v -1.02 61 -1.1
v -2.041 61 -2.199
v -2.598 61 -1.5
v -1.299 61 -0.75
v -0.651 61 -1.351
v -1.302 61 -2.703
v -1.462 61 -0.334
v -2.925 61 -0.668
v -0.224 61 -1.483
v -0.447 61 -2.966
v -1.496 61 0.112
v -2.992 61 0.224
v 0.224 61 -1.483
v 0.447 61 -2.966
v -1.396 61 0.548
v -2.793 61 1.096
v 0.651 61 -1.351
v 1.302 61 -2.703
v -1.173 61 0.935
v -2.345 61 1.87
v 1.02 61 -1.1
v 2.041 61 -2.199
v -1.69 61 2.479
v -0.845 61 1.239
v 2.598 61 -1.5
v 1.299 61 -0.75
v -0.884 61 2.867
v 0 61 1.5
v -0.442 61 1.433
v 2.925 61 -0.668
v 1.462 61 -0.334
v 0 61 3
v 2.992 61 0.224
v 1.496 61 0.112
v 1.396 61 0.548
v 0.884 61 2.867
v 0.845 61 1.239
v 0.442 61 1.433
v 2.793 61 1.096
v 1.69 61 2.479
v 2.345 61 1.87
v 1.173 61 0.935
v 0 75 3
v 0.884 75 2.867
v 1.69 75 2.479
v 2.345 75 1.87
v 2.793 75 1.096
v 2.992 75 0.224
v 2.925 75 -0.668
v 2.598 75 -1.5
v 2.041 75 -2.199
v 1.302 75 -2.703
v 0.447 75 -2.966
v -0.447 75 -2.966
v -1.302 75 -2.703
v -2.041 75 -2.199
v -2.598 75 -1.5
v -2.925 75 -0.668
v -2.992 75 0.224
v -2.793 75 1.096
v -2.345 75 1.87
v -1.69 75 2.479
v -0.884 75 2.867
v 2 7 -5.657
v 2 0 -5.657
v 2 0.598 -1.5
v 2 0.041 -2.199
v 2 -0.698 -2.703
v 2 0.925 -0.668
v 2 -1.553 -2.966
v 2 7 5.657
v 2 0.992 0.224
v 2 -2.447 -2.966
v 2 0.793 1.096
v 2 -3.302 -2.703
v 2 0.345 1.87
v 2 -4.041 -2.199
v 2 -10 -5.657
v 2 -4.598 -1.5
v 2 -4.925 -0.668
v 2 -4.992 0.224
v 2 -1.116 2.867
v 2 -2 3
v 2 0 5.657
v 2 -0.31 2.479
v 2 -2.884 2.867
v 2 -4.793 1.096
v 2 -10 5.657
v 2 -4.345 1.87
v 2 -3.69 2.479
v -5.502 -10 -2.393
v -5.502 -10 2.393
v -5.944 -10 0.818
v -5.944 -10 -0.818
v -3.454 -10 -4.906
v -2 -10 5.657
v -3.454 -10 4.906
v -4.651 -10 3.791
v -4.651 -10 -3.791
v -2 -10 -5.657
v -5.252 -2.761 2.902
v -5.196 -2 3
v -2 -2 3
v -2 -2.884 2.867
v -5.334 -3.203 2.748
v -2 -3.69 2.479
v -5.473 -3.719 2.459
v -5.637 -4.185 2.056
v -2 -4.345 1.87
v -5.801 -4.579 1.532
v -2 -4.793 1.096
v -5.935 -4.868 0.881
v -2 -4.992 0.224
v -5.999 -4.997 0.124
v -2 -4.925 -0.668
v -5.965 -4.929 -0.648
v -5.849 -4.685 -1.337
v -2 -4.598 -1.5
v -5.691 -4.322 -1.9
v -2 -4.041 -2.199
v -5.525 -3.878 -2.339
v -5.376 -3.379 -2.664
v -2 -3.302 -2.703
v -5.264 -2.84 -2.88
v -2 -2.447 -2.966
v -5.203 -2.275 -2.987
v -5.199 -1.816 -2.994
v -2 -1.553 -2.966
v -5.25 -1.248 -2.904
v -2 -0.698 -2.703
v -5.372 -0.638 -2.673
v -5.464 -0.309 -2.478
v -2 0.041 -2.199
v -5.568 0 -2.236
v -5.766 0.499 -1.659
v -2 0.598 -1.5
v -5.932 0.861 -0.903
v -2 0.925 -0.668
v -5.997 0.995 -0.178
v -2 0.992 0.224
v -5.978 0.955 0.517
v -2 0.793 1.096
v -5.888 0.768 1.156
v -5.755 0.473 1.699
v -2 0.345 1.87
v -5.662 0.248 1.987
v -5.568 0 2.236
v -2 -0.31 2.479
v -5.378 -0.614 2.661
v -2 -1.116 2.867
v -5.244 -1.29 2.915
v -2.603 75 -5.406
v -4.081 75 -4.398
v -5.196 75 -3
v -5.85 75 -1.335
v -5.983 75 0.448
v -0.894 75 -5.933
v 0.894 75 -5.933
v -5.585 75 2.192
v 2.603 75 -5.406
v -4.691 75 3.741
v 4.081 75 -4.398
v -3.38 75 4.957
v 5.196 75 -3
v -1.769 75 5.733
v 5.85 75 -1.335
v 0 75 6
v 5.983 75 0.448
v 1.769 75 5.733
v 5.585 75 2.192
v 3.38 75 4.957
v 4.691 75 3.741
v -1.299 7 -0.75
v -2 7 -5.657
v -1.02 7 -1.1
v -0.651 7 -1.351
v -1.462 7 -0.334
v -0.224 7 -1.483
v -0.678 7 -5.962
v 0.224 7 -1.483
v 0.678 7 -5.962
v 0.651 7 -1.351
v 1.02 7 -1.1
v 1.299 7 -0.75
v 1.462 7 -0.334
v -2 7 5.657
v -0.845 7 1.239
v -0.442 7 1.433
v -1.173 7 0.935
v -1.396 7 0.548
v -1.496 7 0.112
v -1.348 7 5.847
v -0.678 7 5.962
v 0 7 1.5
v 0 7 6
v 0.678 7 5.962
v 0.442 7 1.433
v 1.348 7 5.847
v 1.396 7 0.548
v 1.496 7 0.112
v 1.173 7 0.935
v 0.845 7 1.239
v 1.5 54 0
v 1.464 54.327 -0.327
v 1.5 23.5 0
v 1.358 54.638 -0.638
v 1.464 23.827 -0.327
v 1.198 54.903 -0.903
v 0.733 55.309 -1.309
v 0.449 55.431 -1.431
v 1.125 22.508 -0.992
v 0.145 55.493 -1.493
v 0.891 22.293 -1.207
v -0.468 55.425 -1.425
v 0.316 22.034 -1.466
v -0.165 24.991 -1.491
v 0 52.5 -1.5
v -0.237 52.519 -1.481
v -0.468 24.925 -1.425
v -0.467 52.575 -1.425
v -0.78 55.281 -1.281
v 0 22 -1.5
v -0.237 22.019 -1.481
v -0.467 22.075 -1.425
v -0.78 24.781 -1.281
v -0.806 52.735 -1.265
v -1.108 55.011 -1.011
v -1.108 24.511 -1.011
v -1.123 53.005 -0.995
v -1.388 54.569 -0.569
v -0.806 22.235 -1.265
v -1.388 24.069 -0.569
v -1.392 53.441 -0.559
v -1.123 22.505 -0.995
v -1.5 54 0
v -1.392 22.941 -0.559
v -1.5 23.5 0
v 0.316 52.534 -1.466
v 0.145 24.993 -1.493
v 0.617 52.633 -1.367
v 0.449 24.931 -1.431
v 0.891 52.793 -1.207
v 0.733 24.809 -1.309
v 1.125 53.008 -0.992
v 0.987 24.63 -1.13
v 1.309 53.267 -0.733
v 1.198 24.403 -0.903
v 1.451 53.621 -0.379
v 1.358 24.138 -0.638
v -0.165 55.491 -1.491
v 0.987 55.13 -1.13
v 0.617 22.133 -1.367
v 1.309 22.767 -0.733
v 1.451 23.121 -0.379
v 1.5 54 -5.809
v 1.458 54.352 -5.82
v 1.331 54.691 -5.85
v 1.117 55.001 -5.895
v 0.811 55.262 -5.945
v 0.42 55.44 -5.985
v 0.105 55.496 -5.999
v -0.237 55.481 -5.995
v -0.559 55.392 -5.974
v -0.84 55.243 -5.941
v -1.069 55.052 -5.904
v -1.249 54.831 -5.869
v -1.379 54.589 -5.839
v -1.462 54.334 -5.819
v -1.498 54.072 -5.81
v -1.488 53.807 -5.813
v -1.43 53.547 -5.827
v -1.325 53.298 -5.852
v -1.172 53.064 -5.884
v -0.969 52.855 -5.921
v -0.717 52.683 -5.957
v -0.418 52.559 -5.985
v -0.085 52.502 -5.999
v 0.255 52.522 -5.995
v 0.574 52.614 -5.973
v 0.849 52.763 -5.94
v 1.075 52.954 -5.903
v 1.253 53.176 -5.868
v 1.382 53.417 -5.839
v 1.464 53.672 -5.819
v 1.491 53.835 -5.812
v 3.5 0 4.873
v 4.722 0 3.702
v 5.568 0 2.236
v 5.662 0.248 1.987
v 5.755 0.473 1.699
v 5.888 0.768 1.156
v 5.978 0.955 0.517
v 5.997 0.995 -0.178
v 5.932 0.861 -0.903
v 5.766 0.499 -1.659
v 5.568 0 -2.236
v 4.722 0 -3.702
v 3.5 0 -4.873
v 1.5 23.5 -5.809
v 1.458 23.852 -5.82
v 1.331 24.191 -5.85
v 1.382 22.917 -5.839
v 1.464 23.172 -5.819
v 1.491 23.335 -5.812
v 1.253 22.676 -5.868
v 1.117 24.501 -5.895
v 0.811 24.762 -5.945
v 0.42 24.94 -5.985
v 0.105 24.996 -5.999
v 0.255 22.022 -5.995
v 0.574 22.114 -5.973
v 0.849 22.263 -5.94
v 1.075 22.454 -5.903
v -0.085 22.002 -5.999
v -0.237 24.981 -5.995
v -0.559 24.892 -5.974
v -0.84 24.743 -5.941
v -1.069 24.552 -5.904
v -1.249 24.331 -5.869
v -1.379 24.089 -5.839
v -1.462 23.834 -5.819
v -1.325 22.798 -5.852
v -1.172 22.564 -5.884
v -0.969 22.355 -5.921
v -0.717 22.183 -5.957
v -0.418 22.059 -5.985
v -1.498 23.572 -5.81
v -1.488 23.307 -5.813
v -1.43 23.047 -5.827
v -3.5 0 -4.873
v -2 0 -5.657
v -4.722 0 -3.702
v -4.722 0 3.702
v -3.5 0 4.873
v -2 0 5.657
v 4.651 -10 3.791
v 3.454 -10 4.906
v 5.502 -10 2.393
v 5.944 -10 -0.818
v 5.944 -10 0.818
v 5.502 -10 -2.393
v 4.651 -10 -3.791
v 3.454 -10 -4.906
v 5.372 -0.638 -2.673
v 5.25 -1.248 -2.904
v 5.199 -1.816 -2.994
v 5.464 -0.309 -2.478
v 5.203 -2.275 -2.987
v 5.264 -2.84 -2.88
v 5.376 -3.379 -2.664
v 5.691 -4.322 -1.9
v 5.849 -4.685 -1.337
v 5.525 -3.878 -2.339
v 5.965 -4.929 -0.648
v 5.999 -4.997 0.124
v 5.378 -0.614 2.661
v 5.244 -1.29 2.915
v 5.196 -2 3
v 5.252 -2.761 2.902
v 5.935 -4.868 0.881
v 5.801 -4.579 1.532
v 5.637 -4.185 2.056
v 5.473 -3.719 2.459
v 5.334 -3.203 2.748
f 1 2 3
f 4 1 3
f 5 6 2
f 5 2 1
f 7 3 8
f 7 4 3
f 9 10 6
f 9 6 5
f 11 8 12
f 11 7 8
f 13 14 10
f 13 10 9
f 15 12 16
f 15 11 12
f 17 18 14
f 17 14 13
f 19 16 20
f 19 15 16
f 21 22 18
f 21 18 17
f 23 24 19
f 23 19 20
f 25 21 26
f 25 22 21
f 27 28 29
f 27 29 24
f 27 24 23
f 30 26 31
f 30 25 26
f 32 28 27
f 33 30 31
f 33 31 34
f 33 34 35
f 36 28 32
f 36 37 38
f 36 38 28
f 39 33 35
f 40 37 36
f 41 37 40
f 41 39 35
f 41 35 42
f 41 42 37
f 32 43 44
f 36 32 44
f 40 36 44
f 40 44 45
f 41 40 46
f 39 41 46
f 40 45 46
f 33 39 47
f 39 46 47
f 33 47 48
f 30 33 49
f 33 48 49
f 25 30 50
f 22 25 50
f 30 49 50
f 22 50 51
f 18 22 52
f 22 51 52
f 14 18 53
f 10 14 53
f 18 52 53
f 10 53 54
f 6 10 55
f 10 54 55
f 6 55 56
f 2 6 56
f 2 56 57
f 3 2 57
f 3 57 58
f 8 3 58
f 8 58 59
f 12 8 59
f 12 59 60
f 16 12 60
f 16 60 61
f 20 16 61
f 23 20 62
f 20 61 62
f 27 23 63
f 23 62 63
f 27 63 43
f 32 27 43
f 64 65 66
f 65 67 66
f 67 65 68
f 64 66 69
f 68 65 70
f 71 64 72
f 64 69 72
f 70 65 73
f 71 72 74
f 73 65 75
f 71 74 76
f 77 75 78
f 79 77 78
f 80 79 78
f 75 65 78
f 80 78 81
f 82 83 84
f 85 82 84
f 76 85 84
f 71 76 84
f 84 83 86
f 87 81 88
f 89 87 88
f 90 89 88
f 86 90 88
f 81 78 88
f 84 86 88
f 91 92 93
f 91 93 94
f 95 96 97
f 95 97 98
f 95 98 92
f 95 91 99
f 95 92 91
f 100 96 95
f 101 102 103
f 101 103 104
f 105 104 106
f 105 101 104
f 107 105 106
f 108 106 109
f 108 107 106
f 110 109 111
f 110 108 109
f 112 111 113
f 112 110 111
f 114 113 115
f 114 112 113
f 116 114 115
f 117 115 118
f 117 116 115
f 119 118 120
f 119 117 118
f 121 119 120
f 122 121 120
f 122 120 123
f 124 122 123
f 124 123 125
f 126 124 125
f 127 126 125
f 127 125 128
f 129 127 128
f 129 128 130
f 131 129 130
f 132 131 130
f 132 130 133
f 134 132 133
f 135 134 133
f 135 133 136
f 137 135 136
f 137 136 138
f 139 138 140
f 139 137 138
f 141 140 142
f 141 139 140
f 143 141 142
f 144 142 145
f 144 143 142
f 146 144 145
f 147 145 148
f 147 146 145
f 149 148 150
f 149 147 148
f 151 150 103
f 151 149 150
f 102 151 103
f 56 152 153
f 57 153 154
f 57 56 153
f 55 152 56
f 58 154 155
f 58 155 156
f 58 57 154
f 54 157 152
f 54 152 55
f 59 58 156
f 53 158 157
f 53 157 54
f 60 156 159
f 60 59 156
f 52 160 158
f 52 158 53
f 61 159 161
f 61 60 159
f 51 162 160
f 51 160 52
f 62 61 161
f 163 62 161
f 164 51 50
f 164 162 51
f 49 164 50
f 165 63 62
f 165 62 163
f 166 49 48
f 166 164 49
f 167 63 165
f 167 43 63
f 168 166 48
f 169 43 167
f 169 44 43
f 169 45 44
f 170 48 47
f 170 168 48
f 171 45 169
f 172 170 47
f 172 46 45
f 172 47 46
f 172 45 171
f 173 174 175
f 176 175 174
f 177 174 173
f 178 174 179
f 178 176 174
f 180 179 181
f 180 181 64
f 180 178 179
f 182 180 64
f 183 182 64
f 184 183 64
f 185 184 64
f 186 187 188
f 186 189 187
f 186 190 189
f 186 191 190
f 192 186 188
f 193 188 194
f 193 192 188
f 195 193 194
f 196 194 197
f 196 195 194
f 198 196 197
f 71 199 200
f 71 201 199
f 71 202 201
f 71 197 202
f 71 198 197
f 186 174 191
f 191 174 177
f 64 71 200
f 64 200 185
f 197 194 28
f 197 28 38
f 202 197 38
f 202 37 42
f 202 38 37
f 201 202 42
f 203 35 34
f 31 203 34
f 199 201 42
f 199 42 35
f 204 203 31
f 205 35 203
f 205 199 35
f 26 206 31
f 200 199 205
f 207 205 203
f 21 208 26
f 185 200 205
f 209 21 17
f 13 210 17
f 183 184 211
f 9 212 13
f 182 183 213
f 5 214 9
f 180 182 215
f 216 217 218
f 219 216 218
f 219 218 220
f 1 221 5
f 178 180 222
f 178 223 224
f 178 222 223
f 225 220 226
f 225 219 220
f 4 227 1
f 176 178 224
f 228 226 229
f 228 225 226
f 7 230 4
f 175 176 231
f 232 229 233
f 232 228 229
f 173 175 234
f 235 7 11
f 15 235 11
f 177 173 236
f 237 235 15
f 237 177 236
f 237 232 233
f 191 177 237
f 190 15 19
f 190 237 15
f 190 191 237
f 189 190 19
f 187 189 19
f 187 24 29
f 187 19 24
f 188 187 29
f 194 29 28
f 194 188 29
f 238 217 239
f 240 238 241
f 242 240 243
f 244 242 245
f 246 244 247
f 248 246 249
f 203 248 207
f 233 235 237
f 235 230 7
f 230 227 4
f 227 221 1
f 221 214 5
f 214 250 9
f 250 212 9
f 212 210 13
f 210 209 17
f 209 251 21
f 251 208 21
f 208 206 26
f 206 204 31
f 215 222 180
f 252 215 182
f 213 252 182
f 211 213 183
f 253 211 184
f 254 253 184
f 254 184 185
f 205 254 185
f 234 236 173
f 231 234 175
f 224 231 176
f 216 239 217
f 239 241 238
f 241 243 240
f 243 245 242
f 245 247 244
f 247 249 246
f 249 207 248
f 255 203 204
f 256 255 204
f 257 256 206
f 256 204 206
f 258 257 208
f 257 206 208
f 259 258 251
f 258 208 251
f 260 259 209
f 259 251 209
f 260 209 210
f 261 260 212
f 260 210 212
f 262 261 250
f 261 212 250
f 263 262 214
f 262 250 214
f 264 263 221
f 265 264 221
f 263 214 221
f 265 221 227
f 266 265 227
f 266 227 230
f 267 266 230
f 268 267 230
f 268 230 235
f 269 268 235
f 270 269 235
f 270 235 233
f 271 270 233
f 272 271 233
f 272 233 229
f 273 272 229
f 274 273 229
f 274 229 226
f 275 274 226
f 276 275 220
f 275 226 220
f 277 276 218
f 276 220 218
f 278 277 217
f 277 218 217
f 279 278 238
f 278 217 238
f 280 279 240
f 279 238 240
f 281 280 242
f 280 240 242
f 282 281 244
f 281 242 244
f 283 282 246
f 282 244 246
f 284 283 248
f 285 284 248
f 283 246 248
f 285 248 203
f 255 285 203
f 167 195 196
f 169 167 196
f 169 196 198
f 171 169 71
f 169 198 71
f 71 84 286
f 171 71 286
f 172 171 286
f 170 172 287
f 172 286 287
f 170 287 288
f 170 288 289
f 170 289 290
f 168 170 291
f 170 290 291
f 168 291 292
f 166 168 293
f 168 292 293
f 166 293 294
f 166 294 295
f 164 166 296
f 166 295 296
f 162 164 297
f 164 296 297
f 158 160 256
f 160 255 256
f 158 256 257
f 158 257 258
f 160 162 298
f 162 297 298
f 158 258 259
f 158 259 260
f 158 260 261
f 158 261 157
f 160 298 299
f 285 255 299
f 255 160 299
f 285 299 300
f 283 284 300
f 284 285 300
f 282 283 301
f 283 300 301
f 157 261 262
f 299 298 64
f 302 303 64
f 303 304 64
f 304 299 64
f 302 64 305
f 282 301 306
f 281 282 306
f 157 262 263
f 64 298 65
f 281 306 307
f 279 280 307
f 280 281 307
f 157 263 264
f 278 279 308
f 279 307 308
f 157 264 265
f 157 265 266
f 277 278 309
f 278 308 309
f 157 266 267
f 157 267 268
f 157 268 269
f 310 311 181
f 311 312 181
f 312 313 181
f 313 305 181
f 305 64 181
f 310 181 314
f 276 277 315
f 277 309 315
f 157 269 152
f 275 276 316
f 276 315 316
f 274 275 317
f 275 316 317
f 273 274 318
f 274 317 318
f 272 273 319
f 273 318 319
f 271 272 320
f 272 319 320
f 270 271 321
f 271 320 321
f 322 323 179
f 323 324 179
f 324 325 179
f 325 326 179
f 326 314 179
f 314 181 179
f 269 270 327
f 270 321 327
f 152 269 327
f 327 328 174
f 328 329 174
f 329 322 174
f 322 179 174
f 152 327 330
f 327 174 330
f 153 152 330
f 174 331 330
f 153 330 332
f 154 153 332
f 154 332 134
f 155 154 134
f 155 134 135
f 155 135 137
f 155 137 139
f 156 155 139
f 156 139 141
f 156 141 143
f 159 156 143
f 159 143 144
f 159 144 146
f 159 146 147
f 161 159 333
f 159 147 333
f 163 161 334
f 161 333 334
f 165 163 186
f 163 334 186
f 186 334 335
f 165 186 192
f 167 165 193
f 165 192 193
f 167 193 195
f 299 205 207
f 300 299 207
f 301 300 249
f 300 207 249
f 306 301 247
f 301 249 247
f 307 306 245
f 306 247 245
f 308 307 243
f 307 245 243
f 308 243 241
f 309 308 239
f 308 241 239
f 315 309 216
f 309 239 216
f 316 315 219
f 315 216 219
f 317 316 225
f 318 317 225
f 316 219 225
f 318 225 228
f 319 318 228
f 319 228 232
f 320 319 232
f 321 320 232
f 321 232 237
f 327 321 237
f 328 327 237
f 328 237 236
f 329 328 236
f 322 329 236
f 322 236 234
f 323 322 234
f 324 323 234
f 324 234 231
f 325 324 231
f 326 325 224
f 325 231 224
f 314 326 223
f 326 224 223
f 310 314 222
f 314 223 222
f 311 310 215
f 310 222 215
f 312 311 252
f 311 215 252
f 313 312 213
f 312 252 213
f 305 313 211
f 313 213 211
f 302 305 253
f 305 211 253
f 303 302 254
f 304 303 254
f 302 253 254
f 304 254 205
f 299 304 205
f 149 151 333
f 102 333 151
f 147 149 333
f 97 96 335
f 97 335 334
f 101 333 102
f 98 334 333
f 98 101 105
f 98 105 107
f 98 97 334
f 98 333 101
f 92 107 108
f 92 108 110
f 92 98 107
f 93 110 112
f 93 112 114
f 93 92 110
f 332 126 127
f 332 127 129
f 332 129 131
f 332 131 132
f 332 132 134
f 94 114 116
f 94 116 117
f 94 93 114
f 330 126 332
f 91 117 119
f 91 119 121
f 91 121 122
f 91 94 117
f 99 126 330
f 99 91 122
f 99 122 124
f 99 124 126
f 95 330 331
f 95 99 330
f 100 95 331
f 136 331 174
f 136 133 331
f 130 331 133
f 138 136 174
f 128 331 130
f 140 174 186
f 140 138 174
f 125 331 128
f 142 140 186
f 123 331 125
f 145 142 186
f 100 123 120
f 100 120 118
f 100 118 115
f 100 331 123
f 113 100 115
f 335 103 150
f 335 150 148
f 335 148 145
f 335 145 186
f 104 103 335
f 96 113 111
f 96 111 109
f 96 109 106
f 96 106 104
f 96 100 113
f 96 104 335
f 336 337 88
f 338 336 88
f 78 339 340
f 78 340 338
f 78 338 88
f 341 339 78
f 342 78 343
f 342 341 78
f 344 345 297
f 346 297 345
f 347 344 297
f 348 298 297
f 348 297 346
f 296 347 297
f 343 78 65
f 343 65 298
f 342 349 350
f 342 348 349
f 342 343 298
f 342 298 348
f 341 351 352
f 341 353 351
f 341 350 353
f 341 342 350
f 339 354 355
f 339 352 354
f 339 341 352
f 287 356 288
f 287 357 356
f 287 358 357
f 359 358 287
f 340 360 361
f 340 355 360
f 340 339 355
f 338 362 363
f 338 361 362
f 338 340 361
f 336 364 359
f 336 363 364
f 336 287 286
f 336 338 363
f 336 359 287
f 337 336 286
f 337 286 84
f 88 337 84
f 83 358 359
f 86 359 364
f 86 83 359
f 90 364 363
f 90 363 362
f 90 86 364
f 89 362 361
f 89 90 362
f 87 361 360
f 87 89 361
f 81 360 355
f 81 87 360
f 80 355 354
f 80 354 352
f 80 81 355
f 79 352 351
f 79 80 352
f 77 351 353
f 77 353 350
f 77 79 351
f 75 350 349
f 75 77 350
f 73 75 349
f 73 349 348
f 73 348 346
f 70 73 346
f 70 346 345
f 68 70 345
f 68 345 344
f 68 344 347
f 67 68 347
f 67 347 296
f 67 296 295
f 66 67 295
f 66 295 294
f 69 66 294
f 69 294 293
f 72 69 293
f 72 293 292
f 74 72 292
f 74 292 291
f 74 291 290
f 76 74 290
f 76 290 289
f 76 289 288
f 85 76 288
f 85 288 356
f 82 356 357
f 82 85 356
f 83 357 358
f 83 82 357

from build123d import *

# Parameters (mm, degrees)
SKETCH1_R               = 6
SKETCH1_R_2             = 1.5
BOSS_EXTRUDE1_DEPTH     = 75
SKETCH2_R               = 1.5
CUT_EXTRUDE1_DEPTH      = 75
BOSS_EXTRUDE2_START     = 10
SKETCH4_R               = 6
SKETCH4_R_2             = 1.5
BOSS_EXTRUDE2_DEPTH     = 10
SKETCH5_W               = 4
SKETCH5_H               = 27.545605052
CUT_EXTRUDE2_DEPTH      = 17
CUT_EXTRUDE4_DEPTH      = 15
CUT_EXTRUDE4_DEPTH_BACK = 15
SKETCH7_R               = 3
SKETCH8_R               = 3
CUT_EXTRUDE5_DEPTH      = 14


with BuildPart() as part:
    # Sketch1 → Boss-Extrude1 (new body)
    with BuildSketch(Plane(origin=(0, 0, 0), x_dir=(1, 0, 0), z_dir=(0, 1, 0))):
        Circle(SKETCH1_R)
        Circle(SKETCH1_R_2, mode=Mode.SUBTRACT)
    extrude(amount=BOSS_EXTRUDE1_DEPTH)

    # Sketch2 → Cut-Extrude1 (cut)
    with BuildSketch(Plane.XY):
        with Locations((0, 23.5)):
            Circle(SKETCH2_R)
        with Locations((0, 54)):
            Circle(SKETCH2_R)
    extrude(amount=-CUT_EXTRUDE1_DEPTH, mode=Mode.SUBTRACT)

    # Sketch4 → Boss-Extrude2 (add)
    with BuildSketch(Plane.XZ.offset(BOSS_EXTRUDE2_START)):
        Circle(SKETCH4_R)
        Circle(SKETCH4_R_2, mode=Mode.SUBTRACT)
    extrude(amount=-BOSS_EXTRUDE2_DEPTH)

    # Sketch5 → Cut-Extrude2 (cut)
    with BuildSketch(Plane.XZ.offset(10)):
        Rectangle(SKETCH5_W, SKETCH5_H)
    extrude(amount=-CUT_EXTRUDE2_DEPTH, mode=Mode.SUBTRACT)

    # Sketch7 → Cut-Extrude4 (cut, two sides: drawn at the far end of the back side and taken through both)
    with BuildSketch(Plane(origin=(-2, 0, 0), x_dir=(0, 0, -1), z_dir=(1, 0, 0)).offset(-CUT_EXTRUDE4_DEPTH_BACK)):
        with Locations((0, -2)):
            Circle(SKETCH7_R)
    extrude(amount=CUT_EXTRUDE4_DEPTH + CUT_EXTRUDE4_DEPTH_BACK, mode=Mode.SUBTRACT)

    # Sketch8 → Cut-Extrude5 (cut)
    with BuildSketch(Plane(origin=(0, 75, 0), x_dir=(1, 0, 0), z_dir=(0, 1, 0))):
        Circle(SKETCH8_R)
    extrude(amount=-CUT_EXTRUDE5_DEPTH, mode=Mode.SUBTRACT)


solid = part.part
